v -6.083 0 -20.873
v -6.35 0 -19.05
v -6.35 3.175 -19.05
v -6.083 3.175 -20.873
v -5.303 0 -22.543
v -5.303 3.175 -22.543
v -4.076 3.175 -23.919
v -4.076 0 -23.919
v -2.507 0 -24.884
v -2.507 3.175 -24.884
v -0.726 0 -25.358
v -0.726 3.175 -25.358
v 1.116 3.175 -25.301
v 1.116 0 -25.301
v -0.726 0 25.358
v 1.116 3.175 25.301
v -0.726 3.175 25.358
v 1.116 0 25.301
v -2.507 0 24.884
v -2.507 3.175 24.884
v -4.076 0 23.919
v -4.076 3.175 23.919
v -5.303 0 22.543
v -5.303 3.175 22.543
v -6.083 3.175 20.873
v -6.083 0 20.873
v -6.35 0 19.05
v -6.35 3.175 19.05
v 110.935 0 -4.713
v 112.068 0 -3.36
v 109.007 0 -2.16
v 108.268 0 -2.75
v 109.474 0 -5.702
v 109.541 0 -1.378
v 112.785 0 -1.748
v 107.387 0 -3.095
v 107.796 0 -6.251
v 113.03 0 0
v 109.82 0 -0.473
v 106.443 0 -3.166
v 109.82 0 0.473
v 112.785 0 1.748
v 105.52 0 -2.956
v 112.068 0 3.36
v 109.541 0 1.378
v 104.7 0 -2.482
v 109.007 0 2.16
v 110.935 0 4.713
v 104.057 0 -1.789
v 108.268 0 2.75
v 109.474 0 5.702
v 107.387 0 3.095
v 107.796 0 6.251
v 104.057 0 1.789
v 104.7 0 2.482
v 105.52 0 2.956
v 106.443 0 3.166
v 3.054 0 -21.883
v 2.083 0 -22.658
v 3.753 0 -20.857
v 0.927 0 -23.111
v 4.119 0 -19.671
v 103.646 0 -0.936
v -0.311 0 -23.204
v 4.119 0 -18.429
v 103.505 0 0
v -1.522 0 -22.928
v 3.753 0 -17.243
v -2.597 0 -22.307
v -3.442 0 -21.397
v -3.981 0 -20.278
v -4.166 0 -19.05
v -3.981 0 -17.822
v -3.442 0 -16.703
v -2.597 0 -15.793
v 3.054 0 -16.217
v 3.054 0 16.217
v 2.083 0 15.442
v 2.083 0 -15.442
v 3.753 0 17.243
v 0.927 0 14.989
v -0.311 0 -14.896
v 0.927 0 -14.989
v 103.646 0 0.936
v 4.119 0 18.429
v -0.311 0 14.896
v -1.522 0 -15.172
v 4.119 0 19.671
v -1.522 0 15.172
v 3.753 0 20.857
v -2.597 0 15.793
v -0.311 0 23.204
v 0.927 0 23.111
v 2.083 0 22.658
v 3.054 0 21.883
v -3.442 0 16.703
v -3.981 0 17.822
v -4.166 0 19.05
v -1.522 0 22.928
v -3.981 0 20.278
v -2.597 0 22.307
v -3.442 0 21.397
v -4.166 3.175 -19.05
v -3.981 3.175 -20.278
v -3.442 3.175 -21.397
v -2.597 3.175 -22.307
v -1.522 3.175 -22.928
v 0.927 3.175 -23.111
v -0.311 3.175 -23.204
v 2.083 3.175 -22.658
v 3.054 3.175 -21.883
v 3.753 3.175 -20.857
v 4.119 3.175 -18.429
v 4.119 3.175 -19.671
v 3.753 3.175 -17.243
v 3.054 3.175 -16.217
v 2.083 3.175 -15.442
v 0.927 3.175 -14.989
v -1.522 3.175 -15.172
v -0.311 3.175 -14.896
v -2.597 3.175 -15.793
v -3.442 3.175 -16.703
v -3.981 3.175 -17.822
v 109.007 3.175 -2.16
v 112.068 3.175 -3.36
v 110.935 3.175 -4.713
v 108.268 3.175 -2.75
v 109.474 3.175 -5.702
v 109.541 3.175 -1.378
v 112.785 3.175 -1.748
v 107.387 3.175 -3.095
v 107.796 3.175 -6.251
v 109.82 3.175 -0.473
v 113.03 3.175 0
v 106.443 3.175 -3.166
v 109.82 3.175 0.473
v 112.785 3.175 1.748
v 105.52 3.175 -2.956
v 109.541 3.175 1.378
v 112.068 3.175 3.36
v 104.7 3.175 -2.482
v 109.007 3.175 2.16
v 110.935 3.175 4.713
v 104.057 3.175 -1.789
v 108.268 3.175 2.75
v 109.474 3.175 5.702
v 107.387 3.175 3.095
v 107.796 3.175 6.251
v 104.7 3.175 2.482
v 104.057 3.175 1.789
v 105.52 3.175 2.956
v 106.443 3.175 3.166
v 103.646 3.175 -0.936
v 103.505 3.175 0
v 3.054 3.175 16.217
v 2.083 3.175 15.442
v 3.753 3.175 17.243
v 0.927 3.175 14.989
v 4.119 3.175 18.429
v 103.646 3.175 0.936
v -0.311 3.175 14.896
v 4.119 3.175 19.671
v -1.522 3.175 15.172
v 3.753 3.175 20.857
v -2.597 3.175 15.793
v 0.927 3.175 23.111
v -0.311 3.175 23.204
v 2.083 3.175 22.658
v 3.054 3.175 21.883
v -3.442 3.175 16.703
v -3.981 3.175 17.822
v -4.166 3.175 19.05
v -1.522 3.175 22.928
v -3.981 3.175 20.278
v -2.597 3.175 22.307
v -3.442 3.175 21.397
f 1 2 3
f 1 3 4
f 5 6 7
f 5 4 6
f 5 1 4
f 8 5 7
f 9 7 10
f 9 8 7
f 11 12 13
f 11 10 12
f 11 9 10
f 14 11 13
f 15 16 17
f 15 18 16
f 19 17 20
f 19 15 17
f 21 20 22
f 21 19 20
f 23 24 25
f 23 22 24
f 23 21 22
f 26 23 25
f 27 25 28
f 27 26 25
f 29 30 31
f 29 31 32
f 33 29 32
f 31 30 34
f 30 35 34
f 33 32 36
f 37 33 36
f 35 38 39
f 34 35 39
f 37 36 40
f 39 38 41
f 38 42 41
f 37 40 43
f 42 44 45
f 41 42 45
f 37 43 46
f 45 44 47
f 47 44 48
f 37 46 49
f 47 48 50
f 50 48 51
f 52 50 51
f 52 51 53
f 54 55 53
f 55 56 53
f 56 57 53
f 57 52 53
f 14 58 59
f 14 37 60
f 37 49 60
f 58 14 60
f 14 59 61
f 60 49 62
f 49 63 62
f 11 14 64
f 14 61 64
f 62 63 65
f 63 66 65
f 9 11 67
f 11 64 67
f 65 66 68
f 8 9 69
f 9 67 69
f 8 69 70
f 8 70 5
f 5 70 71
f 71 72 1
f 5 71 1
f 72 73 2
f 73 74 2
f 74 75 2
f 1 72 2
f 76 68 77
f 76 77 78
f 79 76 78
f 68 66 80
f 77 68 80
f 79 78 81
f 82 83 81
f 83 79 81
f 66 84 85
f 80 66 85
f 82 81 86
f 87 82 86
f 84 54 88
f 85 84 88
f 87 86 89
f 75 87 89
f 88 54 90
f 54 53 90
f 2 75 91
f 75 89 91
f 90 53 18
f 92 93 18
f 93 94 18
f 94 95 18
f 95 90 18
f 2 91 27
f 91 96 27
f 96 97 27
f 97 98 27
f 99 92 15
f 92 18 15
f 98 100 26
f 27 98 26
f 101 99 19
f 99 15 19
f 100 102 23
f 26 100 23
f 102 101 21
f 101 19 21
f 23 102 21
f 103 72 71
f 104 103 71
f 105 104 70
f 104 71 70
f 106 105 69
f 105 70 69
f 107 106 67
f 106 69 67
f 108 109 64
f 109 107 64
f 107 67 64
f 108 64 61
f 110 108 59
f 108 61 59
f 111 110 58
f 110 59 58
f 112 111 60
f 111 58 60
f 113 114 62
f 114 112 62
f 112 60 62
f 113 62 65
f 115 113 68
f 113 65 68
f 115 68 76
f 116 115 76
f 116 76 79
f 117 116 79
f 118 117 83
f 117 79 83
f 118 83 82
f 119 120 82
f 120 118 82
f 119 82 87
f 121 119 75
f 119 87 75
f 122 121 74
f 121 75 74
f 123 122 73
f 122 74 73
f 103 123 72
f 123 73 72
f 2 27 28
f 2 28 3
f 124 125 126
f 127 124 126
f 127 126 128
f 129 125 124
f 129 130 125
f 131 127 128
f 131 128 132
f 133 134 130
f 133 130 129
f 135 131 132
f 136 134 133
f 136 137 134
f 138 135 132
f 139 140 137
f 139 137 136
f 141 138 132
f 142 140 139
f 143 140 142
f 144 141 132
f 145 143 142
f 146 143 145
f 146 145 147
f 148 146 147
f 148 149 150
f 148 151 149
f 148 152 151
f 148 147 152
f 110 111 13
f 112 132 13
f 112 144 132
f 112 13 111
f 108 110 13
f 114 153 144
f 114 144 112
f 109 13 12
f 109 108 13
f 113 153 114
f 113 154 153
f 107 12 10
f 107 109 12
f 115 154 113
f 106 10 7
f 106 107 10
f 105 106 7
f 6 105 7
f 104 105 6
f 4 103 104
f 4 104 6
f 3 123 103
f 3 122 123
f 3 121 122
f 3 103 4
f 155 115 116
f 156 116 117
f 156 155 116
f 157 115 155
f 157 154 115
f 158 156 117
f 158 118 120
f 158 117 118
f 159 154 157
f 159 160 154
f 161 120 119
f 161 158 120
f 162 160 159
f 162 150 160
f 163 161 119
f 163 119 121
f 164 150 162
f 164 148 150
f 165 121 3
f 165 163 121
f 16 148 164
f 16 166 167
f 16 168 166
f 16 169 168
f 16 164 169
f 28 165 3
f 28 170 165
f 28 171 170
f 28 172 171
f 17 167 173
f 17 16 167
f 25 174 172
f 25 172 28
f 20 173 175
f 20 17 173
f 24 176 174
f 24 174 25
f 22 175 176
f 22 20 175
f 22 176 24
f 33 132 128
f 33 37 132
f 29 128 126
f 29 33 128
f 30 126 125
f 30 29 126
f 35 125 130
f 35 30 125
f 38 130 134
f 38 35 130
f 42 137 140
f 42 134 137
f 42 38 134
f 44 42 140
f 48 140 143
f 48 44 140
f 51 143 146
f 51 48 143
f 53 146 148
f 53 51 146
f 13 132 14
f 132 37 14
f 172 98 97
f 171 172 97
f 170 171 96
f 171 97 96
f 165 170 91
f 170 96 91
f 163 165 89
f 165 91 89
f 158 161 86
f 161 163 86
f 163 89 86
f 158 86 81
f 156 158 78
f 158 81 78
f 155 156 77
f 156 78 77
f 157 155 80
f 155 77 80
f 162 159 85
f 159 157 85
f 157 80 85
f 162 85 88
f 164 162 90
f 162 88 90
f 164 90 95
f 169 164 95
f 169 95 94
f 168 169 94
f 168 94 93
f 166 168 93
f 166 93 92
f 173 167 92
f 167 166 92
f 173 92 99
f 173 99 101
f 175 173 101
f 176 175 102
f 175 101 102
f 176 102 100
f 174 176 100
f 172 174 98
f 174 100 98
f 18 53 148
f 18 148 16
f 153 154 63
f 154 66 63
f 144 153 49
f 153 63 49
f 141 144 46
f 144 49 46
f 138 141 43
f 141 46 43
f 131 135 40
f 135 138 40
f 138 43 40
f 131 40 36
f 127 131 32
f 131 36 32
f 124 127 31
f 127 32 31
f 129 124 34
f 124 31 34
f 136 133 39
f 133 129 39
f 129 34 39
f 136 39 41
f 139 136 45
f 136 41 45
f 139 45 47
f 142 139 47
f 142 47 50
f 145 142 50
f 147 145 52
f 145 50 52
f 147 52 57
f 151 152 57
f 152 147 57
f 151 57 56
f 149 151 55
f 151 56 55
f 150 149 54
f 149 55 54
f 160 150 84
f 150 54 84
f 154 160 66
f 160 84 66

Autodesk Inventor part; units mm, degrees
ref_plane "YZ Plane" through (0, 0, 0) normal (1, 0, 0) x (0, 1, 0)
ref_plane "XZ Plane" through (0, 0, 0) normal (0, 1, 0) x (-1, 0, 0)
ref_plane "XY Plane" through (0, 0, 0) normal (0, 0, 1) x (1, 0, 0)
sketch "Sketch1" plane through (0, 0, 0) normal (0, 1, 0) x (-1, 0, 0)
  circle A0 centre (0, 19.05) radius 4.1656
  circle A1 centre (0, -19.05) radius 4.1656
  circle A2 centre (-106.68, 0) radius 3.175
  arc A3 (6.35, 19.05) -> (-1.1163, 25.3011) centre (0, 19.05) ccw
  arc A4 (-1.1163, -25.3011) -> (6.35, -19.05) centre (0, -19.05) ccw
  line L0 (0, 19.05) -> (-106.68, 0) construction
  line L1 (-106.68, 0) -> (0, -19.05) construction
  line L2 (-107.7963, -6.2511) -> (-1.1163, -25.3011)
  line L3 (-107.7963, 6.2511) -> (-1.1163, 25.3011)
  line L4 (-132.5233, 0) -> (35.4452, 0) construction
  line L5 (6.35, 19.05) -> (6.35, -19.05)
  arc A5 (-107.7963, 6.2511) -> (-107.7963, -6.2511) centre (-106.68, 0) ccw
  point P0 (0, 0)
  dimension "d0" = 38.1
  dimension "d2" = 19.05
  dimension "d3" = 106.68
  dimension "d4" = 8.3312
  dimension "d5" = 8.3312
  dimension "d6" = 6.35
  dimension "d8" = 12.7
  dimension "d9" = 12.7
  dimension "d10" = 20.249
  dimension "d11" = 6.35
  dimension "d12" = 79.875
  dimension "d13" = 0
  dimension "d14" = 29.0952
  dimension "d15" = 138.8733
extrude "Extrusion1" add sketch "Sketch1" along normal blind 3.175
equation "\"d2\" = 0.5 * d0"
equation "\"d5\" = d4"
properties part number "x_axis_shaft_support"
